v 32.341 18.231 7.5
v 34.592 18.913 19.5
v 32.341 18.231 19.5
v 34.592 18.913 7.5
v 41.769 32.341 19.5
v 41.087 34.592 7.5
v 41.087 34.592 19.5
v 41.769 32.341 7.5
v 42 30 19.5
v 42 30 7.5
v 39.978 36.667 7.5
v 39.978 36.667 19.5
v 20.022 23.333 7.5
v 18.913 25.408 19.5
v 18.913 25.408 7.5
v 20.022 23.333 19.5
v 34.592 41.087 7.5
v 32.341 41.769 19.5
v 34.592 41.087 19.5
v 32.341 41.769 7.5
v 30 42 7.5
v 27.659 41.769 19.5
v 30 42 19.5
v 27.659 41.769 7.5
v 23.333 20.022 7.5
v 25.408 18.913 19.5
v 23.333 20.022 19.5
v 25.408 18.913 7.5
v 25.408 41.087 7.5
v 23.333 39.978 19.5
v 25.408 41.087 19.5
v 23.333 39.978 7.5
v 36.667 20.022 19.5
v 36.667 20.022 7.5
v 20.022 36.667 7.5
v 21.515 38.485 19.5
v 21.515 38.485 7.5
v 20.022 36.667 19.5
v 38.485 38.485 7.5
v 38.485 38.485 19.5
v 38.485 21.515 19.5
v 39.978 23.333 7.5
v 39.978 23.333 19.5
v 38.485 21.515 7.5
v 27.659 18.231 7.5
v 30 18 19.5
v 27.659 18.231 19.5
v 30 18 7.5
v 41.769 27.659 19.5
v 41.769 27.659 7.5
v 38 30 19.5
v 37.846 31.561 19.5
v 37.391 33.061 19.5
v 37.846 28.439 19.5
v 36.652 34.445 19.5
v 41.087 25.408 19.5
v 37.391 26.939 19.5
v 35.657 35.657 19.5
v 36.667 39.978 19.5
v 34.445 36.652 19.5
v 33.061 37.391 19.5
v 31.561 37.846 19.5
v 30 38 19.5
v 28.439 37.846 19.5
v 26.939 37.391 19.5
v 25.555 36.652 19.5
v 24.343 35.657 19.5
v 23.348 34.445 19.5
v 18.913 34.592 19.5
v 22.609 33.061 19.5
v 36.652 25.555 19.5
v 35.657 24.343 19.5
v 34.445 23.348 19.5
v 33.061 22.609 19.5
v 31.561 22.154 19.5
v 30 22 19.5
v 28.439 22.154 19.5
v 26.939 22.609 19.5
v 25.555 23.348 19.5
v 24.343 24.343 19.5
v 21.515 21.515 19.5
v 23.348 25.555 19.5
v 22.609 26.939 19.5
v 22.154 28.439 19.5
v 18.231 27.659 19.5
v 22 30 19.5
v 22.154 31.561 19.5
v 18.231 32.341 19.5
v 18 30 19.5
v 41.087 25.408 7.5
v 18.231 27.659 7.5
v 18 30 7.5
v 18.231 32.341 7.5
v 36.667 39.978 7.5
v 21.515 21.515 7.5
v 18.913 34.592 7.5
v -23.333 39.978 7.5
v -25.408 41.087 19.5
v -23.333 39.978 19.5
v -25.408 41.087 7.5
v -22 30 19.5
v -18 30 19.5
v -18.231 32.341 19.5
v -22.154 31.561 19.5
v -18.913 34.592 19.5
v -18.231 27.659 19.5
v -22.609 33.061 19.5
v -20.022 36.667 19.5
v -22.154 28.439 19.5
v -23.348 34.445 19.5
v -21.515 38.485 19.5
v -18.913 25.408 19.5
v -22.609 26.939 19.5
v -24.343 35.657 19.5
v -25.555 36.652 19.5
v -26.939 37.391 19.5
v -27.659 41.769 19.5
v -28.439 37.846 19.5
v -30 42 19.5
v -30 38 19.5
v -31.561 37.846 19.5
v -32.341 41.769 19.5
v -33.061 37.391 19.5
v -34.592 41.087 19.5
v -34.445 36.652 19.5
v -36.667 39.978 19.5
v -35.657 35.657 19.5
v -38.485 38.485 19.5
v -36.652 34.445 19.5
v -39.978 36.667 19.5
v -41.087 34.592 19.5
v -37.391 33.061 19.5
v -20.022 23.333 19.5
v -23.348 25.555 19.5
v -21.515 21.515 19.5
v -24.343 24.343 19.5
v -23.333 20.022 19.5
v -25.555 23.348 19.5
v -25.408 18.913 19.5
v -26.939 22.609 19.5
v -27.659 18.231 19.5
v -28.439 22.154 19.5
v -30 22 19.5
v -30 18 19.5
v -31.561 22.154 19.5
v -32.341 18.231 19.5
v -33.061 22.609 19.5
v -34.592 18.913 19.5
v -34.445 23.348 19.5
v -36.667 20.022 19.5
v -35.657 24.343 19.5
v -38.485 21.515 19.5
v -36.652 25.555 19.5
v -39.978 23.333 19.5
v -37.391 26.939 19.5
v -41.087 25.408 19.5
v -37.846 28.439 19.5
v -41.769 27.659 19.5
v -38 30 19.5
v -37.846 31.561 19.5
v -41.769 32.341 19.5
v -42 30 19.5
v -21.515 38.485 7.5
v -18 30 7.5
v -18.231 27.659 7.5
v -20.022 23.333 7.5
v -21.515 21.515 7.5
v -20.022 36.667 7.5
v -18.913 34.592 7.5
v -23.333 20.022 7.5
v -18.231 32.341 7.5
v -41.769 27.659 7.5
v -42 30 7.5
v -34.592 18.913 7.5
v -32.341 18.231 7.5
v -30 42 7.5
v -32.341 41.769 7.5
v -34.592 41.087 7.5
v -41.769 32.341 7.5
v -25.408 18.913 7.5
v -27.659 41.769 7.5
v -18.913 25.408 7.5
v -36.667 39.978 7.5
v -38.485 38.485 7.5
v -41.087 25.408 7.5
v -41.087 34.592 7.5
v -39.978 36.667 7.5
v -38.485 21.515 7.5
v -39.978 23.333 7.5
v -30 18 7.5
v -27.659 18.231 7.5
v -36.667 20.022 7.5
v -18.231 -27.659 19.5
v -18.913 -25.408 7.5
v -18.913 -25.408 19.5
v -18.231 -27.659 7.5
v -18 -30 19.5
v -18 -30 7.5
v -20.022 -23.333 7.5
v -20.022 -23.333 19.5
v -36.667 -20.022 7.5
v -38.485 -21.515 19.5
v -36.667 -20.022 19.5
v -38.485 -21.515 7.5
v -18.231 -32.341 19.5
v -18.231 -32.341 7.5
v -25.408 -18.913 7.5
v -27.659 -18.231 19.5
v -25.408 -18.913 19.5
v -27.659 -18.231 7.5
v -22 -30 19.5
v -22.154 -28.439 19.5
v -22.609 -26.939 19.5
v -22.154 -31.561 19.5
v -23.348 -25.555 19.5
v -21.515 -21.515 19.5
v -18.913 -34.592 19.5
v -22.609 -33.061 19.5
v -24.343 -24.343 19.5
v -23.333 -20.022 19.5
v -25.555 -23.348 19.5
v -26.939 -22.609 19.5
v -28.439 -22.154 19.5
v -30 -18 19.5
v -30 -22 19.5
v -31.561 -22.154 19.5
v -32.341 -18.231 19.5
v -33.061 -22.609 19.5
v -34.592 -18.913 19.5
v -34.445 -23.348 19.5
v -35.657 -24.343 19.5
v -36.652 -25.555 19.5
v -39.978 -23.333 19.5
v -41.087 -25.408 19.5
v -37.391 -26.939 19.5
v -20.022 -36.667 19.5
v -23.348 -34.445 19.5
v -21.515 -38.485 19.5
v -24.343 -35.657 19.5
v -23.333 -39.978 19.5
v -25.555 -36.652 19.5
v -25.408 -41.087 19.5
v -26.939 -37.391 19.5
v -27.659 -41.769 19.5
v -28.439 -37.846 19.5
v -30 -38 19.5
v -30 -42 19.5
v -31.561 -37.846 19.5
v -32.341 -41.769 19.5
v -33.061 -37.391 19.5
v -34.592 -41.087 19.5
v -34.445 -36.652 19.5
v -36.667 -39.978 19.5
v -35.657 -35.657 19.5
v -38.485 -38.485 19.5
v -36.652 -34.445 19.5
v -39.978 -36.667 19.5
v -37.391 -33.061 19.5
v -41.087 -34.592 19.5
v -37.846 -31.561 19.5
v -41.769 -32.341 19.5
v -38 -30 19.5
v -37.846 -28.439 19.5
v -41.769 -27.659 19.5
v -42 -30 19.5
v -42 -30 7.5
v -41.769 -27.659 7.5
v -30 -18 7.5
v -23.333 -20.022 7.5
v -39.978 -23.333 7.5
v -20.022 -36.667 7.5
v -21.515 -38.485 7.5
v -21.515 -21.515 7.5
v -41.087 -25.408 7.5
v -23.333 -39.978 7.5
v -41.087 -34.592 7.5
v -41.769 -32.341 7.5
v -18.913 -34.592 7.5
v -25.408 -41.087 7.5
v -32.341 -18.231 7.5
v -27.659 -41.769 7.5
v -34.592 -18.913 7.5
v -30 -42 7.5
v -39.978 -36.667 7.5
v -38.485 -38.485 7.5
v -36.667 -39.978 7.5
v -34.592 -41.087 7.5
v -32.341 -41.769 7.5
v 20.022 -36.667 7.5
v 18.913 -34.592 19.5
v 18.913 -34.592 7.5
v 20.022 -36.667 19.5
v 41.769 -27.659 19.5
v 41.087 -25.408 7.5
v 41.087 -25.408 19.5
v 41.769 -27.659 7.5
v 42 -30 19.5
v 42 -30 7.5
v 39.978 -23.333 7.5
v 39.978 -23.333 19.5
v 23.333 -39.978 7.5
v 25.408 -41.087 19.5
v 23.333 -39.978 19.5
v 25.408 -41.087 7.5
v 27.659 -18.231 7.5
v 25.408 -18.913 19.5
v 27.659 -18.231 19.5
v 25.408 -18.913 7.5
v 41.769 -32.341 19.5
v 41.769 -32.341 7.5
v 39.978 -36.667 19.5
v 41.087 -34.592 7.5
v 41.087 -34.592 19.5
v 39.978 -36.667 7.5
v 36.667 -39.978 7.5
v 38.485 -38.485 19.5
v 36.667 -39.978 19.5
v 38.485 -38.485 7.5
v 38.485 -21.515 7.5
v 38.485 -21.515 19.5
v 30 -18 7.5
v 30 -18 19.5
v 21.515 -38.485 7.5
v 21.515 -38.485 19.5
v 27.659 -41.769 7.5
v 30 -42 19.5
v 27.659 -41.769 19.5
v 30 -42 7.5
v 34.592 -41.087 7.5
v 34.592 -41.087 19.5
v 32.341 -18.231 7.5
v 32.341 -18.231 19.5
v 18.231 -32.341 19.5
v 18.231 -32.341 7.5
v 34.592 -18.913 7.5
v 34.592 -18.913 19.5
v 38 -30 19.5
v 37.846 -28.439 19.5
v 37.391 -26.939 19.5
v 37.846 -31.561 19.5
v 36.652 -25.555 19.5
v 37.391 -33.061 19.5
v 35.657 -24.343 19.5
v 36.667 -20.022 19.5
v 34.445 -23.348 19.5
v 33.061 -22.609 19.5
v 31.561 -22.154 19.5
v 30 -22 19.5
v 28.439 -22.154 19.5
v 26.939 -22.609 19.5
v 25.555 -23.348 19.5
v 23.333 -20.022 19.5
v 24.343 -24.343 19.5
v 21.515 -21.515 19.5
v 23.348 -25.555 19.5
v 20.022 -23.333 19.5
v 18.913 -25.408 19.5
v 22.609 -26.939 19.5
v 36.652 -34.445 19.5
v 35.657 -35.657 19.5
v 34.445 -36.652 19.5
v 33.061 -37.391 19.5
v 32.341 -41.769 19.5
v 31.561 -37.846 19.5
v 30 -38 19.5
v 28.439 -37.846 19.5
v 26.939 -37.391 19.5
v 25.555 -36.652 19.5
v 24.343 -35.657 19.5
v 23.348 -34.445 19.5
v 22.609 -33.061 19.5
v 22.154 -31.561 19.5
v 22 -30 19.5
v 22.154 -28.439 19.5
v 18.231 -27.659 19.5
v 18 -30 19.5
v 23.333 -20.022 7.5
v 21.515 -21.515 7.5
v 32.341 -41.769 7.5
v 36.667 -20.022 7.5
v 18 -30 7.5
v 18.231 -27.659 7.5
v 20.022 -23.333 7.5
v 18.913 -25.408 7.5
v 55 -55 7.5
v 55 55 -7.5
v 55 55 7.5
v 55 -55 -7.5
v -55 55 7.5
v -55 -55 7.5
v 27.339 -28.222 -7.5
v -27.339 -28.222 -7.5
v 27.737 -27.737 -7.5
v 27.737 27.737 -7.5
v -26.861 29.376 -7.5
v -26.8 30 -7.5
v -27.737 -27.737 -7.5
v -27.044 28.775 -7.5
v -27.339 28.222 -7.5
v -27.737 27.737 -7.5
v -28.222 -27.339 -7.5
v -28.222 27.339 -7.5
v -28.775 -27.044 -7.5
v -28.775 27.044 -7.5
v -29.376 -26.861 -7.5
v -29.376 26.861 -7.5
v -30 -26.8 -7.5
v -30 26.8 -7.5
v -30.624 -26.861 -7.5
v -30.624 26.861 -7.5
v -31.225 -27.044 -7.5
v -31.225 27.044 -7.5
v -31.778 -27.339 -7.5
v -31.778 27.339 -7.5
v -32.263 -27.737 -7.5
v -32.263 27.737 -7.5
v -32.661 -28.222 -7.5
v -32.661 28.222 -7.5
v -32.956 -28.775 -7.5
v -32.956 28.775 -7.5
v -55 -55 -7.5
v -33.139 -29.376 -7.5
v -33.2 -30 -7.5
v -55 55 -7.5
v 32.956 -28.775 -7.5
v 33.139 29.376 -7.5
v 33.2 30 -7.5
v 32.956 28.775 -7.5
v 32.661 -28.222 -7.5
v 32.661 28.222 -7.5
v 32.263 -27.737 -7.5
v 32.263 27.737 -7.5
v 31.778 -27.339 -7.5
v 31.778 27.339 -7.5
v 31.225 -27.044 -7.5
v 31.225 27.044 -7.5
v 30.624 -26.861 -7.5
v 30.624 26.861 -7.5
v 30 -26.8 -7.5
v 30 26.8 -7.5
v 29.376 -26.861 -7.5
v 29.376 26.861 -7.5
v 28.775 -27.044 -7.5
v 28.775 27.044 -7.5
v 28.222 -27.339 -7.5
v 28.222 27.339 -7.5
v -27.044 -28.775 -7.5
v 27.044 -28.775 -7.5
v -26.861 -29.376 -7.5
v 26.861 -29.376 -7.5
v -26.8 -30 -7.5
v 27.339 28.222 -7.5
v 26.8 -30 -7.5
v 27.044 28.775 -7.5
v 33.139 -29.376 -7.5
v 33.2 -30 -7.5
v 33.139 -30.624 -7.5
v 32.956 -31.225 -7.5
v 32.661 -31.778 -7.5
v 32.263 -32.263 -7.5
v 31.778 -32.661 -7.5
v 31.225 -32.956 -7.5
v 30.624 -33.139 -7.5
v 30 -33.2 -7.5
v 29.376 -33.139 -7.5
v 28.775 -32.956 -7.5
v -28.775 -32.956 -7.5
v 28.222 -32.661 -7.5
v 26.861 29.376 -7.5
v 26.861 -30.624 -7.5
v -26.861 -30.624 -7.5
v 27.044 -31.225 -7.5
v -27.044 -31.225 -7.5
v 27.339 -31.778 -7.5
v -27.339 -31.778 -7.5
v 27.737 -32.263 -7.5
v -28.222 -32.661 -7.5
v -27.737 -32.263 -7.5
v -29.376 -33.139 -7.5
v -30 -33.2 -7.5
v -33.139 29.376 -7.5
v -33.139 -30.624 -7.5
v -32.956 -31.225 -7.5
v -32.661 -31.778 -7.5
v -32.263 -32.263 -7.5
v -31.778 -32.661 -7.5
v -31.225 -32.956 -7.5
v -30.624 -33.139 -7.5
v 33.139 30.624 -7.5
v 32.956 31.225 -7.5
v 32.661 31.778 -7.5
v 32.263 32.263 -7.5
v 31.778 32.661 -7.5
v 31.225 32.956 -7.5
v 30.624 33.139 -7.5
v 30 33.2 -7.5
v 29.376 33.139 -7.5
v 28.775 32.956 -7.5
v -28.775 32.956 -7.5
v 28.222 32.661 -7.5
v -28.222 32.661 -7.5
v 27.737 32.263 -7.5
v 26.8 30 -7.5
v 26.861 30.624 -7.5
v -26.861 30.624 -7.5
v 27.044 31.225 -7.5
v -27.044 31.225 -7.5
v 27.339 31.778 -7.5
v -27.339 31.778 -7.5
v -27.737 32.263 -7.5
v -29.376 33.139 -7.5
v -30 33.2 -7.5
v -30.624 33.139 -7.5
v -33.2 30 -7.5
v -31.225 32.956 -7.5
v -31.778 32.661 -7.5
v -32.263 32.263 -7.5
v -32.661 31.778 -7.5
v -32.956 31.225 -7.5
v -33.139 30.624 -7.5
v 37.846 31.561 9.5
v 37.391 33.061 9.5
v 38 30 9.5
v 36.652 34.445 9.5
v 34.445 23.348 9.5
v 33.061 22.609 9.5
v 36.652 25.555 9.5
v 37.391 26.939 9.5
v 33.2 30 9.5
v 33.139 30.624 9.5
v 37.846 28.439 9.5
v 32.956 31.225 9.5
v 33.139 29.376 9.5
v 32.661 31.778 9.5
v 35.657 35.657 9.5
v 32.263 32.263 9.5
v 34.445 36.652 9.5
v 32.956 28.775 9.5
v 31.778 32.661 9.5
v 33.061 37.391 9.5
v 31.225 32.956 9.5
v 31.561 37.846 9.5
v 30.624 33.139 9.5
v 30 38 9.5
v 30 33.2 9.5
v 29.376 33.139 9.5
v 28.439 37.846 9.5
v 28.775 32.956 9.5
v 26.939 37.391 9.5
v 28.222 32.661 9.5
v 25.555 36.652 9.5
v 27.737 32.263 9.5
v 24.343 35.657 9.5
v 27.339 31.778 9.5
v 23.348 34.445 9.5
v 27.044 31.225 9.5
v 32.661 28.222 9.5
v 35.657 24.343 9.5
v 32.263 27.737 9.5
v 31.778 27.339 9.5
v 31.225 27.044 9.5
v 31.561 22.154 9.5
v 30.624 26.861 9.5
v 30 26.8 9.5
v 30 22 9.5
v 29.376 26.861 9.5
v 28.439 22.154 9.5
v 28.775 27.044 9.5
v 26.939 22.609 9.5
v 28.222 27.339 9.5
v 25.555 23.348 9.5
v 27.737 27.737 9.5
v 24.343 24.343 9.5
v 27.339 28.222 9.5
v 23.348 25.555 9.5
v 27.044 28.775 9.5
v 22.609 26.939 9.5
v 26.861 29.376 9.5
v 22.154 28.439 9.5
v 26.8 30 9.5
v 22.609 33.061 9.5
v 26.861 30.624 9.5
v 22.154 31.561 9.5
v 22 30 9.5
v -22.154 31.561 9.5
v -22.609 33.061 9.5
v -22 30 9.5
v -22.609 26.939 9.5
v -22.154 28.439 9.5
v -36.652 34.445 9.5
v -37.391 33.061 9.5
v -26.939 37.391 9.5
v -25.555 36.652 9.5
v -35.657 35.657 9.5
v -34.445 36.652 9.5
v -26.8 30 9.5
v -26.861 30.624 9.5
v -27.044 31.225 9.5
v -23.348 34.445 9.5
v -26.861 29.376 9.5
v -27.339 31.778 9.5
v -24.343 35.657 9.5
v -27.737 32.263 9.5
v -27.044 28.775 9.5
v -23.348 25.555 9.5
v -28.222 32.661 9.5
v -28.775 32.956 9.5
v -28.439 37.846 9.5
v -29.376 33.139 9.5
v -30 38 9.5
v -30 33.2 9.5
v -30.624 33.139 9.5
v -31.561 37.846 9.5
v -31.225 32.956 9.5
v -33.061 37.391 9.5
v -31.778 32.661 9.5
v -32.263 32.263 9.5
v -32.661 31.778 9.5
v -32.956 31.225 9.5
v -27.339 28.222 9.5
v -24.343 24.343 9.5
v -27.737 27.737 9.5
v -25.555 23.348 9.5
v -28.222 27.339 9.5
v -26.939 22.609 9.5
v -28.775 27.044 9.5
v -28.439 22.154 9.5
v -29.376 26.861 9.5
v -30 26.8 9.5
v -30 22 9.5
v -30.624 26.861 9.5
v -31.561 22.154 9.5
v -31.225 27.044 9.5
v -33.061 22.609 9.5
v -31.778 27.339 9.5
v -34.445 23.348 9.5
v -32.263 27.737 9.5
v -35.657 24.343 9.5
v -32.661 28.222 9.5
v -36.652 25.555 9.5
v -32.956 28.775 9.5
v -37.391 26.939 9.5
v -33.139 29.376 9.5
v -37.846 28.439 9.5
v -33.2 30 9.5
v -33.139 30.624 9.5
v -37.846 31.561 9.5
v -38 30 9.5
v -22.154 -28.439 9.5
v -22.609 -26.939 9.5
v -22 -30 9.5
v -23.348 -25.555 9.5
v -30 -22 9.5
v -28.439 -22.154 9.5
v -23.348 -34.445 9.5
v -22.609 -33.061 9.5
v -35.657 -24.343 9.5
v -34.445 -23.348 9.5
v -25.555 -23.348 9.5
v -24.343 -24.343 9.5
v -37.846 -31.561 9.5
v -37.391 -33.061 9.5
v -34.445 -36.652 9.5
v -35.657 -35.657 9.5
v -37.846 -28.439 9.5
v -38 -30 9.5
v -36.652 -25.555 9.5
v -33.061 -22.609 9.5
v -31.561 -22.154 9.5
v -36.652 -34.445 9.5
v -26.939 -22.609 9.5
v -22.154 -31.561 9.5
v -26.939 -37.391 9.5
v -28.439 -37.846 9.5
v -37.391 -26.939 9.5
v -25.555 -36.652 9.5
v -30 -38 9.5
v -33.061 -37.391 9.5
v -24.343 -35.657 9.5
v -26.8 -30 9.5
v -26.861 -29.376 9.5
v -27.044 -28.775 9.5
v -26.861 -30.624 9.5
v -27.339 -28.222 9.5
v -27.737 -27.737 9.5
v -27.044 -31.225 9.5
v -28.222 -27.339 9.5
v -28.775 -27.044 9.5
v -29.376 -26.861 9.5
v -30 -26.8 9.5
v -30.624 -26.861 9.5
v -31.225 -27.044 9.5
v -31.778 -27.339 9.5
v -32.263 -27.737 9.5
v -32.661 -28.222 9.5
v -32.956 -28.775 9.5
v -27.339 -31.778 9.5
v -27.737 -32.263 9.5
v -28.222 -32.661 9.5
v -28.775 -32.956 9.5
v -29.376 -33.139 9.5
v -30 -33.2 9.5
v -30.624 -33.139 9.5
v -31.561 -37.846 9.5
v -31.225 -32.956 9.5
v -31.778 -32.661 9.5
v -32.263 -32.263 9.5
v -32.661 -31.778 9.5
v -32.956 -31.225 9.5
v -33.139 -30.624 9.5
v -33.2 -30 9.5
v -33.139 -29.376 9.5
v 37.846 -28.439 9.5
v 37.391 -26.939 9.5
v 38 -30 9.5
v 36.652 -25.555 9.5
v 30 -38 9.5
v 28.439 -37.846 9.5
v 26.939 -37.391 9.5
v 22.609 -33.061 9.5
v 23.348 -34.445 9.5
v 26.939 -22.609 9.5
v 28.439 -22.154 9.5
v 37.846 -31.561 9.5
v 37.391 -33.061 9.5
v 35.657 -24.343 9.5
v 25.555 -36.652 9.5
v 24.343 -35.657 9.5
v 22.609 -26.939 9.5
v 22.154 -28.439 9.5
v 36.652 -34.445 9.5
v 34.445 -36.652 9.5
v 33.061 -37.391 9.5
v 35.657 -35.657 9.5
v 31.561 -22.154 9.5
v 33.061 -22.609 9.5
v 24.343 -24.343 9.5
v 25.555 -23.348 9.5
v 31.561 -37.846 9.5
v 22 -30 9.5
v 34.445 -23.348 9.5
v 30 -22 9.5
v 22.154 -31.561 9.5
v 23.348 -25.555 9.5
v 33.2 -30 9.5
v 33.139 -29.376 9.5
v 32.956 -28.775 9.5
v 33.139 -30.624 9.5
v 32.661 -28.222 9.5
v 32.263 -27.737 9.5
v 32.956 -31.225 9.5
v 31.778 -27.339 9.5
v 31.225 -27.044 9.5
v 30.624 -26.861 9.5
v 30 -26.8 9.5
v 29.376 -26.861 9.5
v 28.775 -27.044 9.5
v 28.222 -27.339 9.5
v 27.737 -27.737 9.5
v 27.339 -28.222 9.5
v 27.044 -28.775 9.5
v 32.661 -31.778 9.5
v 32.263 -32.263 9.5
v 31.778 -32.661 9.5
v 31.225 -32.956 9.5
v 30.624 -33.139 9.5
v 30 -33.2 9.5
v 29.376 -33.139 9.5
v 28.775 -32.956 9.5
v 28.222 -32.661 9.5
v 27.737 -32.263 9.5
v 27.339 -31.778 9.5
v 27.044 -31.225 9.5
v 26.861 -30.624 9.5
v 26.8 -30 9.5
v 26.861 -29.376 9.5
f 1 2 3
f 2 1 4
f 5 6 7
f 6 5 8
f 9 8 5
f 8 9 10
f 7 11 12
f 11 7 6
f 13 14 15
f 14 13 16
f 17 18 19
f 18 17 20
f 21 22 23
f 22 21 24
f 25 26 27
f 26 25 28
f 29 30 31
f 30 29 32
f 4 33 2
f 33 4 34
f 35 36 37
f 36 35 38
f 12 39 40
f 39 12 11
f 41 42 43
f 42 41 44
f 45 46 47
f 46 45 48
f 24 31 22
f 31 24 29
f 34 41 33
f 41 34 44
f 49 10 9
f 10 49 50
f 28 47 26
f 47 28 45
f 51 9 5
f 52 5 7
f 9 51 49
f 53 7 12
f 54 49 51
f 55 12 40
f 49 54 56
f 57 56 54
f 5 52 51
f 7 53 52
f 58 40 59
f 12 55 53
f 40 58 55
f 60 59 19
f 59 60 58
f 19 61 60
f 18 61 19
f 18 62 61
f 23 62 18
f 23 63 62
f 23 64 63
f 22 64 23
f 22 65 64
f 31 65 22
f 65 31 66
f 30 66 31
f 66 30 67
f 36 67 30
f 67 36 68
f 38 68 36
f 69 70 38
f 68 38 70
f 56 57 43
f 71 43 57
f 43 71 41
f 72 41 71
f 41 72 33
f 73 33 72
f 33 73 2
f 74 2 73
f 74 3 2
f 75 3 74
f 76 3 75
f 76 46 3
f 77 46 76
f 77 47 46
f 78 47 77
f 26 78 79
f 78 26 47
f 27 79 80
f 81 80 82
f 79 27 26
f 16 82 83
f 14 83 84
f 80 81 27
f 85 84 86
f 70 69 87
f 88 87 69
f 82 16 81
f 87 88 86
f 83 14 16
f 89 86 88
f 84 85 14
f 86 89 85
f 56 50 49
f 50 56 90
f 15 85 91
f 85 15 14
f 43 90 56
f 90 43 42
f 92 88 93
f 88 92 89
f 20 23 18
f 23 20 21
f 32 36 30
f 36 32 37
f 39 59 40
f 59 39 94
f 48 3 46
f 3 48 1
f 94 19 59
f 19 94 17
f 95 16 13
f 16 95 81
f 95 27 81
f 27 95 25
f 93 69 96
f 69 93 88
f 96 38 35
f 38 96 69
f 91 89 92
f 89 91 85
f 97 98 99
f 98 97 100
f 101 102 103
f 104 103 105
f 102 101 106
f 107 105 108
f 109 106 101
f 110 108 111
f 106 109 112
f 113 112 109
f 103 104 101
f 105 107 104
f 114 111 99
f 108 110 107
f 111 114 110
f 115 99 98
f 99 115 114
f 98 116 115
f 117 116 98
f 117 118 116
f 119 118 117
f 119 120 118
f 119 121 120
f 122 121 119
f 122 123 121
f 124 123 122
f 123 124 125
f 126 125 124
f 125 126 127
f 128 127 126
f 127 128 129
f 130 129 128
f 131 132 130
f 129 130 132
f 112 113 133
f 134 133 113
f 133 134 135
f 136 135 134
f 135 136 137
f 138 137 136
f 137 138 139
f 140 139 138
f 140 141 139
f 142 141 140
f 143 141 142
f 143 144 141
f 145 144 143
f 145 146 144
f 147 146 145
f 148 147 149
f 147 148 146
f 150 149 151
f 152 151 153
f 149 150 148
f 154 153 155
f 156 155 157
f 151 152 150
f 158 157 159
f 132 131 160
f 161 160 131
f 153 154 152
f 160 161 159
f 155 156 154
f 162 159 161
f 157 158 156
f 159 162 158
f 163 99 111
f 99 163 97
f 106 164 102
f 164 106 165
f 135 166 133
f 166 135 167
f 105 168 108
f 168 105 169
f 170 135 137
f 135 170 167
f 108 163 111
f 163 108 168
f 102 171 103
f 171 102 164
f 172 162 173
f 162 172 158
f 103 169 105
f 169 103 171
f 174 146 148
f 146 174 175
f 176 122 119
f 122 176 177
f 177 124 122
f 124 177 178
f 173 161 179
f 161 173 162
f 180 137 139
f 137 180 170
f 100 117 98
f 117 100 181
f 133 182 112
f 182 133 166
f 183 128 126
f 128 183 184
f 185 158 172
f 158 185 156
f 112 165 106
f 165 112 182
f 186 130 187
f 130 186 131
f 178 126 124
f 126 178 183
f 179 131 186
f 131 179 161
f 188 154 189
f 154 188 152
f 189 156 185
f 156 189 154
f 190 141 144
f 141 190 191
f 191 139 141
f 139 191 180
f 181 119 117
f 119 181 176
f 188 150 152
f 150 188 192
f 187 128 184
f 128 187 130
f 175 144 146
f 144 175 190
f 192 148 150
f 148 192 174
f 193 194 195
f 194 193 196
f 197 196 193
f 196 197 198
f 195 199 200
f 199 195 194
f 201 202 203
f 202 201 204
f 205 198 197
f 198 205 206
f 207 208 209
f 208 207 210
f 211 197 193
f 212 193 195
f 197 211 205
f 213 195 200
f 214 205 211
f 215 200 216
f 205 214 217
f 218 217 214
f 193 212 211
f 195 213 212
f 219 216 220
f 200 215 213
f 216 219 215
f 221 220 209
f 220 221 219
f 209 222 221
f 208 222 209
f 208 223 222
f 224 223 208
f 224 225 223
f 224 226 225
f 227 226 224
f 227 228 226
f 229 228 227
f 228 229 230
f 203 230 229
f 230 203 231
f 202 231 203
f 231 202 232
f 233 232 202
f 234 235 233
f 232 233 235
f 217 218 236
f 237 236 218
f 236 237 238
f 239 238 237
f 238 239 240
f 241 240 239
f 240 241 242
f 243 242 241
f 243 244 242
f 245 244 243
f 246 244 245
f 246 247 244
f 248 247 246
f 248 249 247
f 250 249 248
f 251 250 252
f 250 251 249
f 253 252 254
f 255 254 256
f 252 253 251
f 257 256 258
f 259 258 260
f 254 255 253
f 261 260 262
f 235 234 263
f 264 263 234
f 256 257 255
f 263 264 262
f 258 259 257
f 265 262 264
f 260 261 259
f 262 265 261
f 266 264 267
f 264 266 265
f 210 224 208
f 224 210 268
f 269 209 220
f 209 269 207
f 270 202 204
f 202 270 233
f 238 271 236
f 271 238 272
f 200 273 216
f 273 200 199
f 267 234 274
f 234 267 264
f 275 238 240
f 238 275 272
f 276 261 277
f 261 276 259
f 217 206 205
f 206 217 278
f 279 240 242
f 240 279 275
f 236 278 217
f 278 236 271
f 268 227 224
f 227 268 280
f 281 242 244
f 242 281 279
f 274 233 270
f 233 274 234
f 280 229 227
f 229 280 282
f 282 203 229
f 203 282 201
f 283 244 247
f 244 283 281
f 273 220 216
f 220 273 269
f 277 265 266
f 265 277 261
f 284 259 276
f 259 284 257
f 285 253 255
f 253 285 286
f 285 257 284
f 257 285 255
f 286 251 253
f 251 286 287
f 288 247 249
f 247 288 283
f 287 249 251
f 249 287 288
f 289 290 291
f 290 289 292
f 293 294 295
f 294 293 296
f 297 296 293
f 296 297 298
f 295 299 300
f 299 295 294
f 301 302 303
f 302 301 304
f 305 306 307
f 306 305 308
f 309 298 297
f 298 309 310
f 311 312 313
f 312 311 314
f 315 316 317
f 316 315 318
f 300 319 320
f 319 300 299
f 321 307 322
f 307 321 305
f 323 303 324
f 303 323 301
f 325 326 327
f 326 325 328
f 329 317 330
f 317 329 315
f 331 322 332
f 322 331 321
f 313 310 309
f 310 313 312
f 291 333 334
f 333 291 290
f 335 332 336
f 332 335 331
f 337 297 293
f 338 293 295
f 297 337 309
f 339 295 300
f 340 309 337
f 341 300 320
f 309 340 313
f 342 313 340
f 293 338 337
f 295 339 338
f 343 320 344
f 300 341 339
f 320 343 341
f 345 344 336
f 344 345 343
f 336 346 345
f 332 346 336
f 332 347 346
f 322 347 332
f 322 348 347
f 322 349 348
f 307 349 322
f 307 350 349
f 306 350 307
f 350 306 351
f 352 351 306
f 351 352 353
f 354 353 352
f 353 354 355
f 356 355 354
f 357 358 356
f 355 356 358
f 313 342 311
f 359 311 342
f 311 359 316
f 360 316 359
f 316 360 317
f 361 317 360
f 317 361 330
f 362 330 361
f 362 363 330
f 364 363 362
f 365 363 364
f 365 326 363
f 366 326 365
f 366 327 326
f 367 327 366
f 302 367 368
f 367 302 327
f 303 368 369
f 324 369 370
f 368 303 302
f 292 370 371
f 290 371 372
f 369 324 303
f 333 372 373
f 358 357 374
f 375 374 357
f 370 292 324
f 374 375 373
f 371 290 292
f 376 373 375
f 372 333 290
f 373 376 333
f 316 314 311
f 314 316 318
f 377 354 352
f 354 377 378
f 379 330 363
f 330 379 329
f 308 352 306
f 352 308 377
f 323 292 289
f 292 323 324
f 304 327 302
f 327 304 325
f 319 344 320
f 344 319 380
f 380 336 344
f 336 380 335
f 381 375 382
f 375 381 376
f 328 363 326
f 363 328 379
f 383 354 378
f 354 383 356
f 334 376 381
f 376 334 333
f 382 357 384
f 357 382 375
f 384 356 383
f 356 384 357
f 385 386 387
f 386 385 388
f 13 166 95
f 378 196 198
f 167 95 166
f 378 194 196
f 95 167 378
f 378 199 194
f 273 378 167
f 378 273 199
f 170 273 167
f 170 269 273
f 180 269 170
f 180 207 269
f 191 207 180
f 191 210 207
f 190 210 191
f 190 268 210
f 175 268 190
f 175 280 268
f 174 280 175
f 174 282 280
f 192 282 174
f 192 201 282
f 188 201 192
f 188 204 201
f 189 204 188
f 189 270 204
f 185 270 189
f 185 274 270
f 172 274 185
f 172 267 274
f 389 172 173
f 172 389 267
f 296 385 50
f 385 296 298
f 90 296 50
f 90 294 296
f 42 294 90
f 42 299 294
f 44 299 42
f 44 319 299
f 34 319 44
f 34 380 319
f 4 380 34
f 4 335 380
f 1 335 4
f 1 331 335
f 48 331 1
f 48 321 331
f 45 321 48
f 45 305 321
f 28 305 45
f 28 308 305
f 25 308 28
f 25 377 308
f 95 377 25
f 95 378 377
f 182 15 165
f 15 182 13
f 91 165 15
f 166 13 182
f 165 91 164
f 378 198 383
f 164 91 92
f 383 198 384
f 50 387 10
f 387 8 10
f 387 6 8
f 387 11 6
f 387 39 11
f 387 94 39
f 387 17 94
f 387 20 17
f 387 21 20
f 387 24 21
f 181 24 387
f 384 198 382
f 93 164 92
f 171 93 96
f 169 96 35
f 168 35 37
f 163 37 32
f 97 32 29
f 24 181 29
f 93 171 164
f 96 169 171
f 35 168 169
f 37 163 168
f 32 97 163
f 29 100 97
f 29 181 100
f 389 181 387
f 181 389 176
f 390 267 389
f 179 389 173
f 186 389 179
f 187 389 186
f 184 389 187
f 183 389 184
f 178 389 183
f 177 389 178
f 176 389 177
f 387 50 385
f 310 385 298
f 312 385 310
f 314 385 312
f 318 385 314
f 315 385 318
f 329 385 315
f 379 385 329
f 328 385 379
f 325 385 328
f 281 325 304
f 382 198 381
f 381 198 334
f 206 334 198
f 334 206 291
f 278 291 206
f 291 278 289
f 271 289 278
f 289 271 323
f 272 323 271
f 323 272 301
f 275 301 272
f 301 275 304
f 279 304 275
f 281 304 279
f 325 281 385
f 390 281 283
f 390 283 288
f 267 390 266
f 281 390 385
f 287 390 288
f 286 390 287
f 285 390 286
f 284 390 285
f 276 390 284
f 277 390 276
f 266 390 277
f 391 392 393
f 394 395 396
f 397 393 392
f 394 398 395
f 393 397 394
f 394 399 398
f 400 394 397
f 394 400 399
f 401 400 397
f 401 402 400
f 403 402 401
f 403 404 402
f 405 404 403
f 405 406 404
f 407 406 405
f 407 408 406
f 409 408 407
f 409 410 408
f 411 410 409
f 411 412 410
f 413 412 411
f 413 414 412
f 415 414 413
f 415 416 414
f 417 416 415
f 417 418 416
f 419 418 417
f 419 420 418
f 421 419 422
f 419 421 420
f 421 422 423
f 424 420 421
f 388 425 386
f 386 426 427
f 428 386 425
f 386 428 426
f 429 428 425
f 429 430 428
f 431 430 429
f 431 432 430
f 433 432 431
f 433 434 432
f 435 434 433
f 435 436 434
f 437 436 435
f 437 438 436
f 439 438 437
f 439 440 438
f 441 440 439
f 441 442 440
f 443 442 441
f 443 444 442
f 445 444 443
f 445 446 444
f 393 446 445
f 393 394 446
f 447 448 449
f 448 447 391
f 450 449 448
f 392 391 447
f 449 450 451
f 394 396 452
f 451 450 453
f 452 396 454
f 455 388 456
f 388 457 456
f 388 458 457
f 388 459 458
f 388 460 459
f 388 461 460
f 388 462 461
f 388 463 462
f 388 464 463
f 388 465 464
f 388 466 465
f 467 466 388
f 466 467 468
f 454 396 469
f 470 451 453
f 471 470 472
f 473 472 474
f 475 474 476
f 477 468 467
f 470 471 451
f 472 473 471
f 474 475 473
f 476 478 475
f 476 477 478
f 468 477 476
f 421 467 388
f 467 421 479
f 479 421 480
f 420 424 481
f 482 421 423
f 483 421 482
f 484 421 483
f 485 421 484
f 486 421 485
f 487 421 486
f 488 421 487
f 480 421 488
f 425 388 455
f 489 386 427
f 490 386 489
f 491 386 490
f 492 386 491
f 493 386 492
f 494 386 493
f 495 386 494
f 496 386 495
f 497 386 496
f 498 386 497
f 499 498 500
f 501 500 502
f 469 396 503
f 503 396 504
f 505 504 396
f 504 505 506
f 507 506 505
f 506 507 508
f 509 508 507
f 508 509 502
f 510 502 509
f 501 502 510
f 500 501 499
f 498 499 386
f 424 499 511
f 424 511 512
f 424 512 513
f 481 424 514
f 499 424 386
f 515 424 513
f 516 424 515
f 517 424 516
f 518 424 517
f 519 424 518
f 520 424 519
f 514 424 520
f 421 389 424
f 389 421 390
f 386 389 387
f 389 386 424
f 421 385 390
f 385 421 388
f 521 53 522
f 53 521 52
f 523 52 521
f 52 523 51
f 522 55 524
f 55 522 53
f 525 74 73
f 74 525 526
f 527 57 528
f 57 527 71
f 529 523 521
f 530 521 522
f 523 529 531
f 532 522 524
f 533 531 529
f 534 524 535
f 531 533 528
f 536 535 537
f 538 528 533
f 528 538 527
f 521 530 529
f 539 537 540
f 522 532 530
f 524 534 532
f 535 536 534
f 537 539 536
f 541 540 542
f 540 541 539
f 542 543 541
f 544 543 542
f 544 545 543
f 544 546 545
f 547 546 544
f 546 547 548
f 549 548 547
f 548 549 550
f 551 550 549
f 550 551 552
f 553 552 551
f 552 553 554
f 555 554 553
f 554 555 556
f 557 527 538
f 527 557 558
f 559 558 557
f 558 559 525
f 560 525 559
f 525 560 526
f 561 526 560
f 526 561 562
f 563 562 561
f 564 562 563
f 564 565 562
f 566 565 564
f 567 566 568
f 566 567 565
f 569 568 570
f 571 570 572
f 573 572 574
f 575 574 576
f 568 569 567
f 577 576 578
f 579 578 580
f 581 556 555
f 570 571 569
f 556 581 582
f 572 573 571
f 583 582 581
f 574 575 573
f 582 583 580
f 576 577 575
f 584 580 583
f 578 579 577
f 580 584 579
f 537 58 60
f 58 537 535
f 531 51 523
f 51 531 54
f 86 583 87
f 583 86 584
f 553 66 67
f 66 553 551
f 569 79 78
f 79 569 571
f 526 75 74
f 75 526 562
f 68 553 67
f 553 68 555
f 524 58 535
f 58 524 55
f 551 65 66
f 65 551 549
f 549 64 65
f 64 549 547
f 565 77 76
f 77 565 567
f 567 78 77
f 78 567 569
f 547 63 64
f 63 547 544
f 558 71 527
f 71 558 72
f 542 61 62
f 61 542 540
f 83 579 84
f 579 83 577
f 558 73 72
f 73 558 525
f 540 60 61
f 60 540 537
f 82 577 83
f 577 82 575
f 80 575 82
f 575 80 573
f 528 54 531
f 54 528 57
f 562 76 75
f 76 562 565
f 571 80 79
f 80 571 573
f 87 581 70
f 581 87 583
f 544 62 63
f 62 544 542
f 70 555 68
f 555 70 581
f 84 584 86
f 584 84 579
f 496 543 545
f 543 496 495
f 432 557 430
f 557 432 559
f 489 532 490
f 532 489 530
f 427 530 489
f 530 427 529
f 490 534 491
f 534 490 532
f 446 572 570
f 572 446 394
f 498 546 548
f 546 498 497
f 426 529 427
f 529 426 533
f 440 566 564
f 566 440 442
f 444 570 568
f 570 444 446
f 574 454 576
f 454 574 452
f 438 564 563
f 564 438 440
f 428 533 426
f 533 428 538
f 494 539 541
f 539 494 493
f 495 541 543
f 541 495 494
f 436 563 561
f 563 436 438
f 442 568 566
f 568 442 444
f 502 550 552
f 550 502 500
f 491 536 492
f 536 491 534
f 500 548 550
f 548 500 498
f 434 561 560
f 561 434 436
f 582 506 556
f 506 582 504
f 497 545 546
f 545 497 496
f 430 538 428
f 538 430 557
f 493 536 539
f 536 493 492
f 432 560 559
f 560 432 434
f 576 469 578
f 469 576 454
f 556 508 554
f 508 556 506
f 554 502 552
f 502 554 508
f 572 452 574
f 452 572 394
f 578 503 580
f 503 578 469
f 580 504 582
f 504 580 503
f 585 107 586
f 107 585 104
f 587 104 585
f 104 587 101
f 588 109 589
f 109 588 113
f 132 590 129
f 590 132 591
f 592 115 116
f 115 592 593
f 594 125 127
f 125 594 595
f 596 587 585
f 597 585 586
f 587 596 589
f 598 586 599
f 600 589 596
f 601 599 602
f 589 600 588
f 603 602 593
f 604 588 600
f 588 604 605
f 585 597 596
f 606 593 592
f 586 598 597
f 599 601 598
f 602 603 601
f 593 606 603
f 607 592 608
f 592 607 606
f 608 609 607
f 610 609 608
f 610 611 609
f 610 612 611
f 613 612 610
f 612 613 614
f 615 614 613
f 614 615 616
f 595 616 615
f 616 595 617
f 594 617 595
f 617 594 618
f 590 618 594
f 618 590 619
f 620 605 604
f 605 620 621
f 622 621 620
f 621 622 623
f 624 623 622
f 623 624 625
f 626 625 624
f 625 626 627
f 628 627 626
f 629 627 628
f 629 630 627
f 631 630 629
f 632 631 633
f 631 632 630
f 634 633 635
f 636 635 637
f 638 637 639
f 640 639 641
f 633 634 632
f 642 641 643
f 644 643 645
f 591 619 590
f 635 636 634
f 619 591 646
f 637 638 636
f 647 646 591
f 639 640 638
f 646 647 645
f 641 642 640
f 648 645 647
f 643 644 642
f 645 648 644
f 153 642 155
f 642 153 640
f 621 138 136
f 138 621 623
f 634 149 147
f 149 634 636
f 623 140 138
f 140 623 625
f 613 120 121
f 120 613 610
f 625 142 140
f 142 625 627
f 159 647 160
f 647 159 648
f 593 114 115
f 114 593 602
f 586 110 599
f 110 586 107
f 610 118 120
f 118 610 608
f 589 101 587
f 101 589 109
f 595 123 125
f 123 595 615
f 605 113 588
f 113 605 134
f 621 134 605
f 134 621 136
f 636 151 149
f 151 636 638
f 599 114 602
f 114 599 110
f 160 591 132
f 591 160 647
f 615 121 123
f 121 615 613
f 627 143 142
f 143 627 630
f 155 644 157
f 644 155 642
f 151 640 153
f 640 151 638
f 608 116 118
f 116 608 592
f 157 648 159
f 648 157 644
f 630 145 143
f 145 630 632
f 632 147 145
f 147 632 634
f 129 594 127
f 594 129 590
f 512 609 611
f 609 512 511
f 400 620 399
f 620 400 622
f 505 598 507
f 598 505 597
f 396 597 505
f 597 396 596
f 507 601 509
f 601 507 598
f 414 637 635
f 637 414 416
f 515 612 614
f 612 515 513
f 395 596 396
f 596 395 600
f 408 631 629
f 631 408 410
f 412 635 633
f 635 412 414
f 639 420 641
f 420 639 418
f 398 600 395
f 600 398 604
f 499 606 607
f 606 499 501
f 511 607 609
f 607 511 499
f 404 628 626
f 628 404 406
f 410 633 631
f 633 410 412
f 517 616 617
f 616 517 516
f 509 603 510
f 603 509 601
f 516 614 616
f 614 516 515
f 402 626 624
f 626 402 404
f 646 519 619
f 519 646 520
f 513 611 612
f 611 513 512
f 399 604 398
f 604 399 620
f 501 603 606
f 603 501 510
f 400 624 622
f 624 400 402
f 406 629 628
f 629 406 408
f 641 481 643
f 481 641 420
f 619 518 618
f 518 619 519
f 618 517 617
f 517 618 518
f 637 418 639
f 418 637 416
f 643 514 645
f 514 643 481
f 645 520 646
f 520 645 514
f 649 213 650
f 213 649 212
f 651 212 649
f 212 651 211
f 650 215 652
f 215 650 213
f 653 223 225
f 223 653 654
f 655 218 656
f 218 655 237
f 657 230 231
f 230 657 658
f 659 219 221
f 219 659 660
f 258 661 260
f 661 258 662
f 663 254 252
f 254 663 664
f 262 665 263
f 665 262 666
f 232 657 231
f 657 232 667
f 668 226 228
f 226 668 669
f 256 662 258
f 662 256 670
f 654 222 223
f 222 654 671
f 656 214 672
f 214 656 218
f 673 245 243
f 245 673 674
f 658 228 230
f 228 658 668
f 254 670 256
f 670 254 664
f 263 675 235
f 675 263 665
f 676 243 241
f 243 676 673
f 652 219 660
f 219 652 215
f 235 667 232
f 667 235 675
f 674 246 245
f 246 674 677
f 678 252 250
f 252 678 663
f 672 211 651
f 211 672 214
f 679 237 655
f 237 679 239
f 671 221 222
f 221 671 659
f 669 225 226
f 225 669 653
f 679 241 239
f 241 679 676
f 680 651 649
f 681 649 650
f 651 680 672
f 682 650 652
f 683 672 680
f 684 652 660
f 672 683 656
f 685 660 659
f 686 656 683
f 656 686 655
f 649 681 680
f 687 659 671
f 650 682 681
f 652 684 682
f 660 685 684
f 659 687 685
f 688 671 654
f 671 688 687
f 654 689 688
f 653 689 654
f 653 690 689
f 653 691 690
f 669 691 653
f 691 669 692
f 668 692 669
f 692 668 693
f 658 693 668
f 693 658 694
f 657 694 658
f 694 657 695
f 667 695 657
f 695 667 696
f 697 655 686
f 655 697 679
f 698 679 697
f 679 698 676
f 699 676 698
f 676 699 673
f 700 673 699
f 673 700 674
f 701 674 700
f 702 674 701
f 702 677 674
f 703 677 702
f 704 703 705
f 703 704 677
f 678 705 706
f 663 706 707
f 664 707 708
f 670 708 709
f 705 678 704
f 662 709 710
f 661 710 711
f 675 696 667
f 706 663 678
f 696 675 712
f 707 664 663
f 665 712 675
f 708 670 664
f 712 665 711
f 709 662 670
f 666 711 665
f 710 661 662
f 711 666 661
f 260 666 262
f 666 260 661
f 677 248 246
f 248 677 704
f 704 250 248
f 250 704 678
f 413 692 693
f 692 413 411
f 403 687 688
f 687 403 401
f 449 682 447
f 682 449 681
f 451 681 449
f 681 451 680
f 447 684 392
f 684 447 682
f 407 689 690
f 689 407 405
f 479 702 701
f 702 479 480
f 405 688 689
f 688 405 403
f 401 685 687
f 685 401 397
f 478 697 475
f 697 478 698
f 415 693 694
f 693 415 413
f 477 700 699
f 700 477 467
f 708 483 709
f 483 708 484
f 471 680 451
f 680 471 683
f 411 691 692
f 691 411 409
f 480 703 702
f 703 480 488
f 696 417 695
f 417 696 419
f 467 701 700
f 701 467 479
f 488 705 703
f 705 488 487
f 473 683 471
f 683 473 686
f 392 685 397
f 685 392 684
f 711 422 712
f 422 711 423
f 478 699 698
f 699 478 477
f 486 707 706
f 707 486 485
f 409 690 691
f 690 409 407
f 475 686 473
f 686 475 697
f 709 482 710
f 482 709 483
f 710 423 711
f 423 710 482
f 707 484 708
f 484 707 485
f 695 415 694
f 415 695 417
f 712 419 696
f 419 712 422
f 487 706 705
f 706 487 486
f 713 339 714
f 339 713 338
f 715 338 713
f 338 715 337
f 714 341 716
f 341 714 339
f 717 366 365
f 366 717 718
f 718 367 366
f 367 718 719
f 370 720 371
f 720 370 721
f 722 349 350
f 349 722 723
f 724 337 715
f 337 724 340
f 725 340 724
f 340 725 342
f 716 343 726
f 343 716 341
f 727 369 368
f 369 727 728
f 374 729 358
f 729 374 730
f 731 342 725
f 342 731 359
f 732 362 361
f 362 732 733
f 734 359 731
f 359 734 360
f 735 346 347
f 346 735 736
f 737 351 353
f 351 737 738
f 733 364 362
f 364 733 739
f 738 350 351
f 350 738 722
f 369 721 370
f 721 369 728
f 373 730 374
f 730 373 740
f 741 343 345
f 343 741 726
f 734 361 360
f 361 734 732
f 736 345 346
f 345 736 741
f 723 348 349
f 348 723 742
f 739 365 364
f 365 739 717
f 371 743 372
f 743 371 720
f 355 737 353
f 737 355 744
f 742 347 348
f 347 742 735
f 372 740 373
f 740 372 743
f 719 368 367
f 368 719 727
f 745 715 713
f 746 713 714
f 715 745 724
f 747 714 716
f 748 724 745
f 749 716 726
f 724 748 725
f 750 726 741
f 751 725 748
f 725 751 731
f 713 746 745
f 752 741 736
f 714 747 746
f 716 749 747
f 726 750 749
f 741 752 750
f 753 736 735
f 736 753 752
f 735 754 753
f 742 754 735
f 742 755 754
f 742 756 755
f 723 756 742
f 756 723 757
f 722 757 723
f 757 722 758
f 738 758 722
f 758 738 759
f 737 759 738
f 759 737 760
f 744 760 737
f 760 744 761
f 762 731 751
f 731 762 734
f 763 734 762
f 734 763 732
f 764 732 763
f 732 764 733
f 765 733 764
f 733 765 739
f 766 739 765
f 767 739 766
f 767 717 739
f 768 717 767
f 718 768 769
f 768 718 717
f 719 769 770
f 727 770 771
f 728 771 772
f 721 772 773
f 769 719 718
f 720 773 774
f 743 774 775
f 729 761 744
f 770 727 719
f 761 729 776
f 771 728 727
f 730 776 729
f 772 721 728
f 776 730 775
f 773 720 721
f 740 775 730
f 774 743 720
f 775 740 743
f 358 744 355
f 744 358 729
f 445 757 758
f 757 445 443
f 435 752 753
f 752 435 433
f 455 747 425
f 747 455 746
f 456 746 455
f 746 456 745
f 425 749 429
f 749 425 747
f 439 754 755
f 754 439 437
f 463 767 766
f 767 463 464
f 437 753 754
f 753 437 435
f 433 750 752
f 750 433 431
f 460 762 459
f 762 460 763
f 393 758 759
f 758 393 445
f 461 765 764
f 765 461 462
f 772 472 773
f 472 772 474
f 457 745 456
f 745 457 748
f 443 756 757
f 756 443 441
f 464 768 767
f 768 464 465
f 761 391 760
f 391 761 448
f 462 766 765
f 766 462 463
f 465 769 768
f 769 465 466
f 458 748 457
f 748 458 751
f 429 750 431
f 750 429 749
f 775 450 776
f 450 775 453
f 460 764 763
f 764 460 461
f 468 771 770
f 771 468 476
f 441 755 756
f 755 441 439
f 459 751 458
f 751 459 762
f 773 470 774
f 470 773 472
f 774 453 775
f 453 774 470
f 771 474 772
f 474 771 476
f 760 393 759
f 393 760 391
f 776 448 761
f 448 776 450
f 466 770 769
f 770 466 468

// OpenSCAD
$fn = 32;

// ----------------------------------------------------------------------
// Socket pad plate
// bosses with counterbored sockets for the screws
// ----------------------------------------------------------------------

// --- parameters (mm) ---
base_t = 15;             // base plate thickness
boss_h = 12;             // boss height above the base plate
boss_d = 24;             // boss diameter
socket_d = 16;           // socket diameter
socket_depth = 10;       // socket depth from the boss face
bolt_d = 6.4;            // screw clearance hole through the socket floor
plate = [110, 110, 15];  // overall size (x, y, z)
edge = 25;               // boss centre offset from the plate edge
pads = 4;                // boss count, one per corner

// --- derived feature positions (mm) ---
height = base_t + boss_h;        // = 27   overall height of the part
corner_x = plate[0] / 2 - edge;  // = 30   boss centre X
corner_y = plate[1] / 2 - edge;  // = 30   boss centre Y
feature_centers = [
  [corner_x, corner_y],
  [-corner_x, corner_y],
  [-corner_x, -corner_y],
  [corner_x, -corner_y]
];   // boss centres: sockets, holes and the pads themselves are placed from here

// base plate, bosses on feature_centers, socket + through hole in each
difference() {
  union() {
    cube(plate, center = true);
    for (centre = feature_centers)
      translate([centre[0], centre[1], plate[2] / 2 - 1])
        cylinder(d = boss_d, h = boss_h + 1);
  }
  for (centre = feature_centers) {
    translate([centre[0], centre[1], plate[2] / 2 + boss_h - socket_depth])
      cylinder(d = socket_d, h = socket_depth + 1);
    translate([centre[0], centre[1], -height])
      cylinder(d = bolt_d, h = 2 * height + 2);  // through the socket floor
  }
}
